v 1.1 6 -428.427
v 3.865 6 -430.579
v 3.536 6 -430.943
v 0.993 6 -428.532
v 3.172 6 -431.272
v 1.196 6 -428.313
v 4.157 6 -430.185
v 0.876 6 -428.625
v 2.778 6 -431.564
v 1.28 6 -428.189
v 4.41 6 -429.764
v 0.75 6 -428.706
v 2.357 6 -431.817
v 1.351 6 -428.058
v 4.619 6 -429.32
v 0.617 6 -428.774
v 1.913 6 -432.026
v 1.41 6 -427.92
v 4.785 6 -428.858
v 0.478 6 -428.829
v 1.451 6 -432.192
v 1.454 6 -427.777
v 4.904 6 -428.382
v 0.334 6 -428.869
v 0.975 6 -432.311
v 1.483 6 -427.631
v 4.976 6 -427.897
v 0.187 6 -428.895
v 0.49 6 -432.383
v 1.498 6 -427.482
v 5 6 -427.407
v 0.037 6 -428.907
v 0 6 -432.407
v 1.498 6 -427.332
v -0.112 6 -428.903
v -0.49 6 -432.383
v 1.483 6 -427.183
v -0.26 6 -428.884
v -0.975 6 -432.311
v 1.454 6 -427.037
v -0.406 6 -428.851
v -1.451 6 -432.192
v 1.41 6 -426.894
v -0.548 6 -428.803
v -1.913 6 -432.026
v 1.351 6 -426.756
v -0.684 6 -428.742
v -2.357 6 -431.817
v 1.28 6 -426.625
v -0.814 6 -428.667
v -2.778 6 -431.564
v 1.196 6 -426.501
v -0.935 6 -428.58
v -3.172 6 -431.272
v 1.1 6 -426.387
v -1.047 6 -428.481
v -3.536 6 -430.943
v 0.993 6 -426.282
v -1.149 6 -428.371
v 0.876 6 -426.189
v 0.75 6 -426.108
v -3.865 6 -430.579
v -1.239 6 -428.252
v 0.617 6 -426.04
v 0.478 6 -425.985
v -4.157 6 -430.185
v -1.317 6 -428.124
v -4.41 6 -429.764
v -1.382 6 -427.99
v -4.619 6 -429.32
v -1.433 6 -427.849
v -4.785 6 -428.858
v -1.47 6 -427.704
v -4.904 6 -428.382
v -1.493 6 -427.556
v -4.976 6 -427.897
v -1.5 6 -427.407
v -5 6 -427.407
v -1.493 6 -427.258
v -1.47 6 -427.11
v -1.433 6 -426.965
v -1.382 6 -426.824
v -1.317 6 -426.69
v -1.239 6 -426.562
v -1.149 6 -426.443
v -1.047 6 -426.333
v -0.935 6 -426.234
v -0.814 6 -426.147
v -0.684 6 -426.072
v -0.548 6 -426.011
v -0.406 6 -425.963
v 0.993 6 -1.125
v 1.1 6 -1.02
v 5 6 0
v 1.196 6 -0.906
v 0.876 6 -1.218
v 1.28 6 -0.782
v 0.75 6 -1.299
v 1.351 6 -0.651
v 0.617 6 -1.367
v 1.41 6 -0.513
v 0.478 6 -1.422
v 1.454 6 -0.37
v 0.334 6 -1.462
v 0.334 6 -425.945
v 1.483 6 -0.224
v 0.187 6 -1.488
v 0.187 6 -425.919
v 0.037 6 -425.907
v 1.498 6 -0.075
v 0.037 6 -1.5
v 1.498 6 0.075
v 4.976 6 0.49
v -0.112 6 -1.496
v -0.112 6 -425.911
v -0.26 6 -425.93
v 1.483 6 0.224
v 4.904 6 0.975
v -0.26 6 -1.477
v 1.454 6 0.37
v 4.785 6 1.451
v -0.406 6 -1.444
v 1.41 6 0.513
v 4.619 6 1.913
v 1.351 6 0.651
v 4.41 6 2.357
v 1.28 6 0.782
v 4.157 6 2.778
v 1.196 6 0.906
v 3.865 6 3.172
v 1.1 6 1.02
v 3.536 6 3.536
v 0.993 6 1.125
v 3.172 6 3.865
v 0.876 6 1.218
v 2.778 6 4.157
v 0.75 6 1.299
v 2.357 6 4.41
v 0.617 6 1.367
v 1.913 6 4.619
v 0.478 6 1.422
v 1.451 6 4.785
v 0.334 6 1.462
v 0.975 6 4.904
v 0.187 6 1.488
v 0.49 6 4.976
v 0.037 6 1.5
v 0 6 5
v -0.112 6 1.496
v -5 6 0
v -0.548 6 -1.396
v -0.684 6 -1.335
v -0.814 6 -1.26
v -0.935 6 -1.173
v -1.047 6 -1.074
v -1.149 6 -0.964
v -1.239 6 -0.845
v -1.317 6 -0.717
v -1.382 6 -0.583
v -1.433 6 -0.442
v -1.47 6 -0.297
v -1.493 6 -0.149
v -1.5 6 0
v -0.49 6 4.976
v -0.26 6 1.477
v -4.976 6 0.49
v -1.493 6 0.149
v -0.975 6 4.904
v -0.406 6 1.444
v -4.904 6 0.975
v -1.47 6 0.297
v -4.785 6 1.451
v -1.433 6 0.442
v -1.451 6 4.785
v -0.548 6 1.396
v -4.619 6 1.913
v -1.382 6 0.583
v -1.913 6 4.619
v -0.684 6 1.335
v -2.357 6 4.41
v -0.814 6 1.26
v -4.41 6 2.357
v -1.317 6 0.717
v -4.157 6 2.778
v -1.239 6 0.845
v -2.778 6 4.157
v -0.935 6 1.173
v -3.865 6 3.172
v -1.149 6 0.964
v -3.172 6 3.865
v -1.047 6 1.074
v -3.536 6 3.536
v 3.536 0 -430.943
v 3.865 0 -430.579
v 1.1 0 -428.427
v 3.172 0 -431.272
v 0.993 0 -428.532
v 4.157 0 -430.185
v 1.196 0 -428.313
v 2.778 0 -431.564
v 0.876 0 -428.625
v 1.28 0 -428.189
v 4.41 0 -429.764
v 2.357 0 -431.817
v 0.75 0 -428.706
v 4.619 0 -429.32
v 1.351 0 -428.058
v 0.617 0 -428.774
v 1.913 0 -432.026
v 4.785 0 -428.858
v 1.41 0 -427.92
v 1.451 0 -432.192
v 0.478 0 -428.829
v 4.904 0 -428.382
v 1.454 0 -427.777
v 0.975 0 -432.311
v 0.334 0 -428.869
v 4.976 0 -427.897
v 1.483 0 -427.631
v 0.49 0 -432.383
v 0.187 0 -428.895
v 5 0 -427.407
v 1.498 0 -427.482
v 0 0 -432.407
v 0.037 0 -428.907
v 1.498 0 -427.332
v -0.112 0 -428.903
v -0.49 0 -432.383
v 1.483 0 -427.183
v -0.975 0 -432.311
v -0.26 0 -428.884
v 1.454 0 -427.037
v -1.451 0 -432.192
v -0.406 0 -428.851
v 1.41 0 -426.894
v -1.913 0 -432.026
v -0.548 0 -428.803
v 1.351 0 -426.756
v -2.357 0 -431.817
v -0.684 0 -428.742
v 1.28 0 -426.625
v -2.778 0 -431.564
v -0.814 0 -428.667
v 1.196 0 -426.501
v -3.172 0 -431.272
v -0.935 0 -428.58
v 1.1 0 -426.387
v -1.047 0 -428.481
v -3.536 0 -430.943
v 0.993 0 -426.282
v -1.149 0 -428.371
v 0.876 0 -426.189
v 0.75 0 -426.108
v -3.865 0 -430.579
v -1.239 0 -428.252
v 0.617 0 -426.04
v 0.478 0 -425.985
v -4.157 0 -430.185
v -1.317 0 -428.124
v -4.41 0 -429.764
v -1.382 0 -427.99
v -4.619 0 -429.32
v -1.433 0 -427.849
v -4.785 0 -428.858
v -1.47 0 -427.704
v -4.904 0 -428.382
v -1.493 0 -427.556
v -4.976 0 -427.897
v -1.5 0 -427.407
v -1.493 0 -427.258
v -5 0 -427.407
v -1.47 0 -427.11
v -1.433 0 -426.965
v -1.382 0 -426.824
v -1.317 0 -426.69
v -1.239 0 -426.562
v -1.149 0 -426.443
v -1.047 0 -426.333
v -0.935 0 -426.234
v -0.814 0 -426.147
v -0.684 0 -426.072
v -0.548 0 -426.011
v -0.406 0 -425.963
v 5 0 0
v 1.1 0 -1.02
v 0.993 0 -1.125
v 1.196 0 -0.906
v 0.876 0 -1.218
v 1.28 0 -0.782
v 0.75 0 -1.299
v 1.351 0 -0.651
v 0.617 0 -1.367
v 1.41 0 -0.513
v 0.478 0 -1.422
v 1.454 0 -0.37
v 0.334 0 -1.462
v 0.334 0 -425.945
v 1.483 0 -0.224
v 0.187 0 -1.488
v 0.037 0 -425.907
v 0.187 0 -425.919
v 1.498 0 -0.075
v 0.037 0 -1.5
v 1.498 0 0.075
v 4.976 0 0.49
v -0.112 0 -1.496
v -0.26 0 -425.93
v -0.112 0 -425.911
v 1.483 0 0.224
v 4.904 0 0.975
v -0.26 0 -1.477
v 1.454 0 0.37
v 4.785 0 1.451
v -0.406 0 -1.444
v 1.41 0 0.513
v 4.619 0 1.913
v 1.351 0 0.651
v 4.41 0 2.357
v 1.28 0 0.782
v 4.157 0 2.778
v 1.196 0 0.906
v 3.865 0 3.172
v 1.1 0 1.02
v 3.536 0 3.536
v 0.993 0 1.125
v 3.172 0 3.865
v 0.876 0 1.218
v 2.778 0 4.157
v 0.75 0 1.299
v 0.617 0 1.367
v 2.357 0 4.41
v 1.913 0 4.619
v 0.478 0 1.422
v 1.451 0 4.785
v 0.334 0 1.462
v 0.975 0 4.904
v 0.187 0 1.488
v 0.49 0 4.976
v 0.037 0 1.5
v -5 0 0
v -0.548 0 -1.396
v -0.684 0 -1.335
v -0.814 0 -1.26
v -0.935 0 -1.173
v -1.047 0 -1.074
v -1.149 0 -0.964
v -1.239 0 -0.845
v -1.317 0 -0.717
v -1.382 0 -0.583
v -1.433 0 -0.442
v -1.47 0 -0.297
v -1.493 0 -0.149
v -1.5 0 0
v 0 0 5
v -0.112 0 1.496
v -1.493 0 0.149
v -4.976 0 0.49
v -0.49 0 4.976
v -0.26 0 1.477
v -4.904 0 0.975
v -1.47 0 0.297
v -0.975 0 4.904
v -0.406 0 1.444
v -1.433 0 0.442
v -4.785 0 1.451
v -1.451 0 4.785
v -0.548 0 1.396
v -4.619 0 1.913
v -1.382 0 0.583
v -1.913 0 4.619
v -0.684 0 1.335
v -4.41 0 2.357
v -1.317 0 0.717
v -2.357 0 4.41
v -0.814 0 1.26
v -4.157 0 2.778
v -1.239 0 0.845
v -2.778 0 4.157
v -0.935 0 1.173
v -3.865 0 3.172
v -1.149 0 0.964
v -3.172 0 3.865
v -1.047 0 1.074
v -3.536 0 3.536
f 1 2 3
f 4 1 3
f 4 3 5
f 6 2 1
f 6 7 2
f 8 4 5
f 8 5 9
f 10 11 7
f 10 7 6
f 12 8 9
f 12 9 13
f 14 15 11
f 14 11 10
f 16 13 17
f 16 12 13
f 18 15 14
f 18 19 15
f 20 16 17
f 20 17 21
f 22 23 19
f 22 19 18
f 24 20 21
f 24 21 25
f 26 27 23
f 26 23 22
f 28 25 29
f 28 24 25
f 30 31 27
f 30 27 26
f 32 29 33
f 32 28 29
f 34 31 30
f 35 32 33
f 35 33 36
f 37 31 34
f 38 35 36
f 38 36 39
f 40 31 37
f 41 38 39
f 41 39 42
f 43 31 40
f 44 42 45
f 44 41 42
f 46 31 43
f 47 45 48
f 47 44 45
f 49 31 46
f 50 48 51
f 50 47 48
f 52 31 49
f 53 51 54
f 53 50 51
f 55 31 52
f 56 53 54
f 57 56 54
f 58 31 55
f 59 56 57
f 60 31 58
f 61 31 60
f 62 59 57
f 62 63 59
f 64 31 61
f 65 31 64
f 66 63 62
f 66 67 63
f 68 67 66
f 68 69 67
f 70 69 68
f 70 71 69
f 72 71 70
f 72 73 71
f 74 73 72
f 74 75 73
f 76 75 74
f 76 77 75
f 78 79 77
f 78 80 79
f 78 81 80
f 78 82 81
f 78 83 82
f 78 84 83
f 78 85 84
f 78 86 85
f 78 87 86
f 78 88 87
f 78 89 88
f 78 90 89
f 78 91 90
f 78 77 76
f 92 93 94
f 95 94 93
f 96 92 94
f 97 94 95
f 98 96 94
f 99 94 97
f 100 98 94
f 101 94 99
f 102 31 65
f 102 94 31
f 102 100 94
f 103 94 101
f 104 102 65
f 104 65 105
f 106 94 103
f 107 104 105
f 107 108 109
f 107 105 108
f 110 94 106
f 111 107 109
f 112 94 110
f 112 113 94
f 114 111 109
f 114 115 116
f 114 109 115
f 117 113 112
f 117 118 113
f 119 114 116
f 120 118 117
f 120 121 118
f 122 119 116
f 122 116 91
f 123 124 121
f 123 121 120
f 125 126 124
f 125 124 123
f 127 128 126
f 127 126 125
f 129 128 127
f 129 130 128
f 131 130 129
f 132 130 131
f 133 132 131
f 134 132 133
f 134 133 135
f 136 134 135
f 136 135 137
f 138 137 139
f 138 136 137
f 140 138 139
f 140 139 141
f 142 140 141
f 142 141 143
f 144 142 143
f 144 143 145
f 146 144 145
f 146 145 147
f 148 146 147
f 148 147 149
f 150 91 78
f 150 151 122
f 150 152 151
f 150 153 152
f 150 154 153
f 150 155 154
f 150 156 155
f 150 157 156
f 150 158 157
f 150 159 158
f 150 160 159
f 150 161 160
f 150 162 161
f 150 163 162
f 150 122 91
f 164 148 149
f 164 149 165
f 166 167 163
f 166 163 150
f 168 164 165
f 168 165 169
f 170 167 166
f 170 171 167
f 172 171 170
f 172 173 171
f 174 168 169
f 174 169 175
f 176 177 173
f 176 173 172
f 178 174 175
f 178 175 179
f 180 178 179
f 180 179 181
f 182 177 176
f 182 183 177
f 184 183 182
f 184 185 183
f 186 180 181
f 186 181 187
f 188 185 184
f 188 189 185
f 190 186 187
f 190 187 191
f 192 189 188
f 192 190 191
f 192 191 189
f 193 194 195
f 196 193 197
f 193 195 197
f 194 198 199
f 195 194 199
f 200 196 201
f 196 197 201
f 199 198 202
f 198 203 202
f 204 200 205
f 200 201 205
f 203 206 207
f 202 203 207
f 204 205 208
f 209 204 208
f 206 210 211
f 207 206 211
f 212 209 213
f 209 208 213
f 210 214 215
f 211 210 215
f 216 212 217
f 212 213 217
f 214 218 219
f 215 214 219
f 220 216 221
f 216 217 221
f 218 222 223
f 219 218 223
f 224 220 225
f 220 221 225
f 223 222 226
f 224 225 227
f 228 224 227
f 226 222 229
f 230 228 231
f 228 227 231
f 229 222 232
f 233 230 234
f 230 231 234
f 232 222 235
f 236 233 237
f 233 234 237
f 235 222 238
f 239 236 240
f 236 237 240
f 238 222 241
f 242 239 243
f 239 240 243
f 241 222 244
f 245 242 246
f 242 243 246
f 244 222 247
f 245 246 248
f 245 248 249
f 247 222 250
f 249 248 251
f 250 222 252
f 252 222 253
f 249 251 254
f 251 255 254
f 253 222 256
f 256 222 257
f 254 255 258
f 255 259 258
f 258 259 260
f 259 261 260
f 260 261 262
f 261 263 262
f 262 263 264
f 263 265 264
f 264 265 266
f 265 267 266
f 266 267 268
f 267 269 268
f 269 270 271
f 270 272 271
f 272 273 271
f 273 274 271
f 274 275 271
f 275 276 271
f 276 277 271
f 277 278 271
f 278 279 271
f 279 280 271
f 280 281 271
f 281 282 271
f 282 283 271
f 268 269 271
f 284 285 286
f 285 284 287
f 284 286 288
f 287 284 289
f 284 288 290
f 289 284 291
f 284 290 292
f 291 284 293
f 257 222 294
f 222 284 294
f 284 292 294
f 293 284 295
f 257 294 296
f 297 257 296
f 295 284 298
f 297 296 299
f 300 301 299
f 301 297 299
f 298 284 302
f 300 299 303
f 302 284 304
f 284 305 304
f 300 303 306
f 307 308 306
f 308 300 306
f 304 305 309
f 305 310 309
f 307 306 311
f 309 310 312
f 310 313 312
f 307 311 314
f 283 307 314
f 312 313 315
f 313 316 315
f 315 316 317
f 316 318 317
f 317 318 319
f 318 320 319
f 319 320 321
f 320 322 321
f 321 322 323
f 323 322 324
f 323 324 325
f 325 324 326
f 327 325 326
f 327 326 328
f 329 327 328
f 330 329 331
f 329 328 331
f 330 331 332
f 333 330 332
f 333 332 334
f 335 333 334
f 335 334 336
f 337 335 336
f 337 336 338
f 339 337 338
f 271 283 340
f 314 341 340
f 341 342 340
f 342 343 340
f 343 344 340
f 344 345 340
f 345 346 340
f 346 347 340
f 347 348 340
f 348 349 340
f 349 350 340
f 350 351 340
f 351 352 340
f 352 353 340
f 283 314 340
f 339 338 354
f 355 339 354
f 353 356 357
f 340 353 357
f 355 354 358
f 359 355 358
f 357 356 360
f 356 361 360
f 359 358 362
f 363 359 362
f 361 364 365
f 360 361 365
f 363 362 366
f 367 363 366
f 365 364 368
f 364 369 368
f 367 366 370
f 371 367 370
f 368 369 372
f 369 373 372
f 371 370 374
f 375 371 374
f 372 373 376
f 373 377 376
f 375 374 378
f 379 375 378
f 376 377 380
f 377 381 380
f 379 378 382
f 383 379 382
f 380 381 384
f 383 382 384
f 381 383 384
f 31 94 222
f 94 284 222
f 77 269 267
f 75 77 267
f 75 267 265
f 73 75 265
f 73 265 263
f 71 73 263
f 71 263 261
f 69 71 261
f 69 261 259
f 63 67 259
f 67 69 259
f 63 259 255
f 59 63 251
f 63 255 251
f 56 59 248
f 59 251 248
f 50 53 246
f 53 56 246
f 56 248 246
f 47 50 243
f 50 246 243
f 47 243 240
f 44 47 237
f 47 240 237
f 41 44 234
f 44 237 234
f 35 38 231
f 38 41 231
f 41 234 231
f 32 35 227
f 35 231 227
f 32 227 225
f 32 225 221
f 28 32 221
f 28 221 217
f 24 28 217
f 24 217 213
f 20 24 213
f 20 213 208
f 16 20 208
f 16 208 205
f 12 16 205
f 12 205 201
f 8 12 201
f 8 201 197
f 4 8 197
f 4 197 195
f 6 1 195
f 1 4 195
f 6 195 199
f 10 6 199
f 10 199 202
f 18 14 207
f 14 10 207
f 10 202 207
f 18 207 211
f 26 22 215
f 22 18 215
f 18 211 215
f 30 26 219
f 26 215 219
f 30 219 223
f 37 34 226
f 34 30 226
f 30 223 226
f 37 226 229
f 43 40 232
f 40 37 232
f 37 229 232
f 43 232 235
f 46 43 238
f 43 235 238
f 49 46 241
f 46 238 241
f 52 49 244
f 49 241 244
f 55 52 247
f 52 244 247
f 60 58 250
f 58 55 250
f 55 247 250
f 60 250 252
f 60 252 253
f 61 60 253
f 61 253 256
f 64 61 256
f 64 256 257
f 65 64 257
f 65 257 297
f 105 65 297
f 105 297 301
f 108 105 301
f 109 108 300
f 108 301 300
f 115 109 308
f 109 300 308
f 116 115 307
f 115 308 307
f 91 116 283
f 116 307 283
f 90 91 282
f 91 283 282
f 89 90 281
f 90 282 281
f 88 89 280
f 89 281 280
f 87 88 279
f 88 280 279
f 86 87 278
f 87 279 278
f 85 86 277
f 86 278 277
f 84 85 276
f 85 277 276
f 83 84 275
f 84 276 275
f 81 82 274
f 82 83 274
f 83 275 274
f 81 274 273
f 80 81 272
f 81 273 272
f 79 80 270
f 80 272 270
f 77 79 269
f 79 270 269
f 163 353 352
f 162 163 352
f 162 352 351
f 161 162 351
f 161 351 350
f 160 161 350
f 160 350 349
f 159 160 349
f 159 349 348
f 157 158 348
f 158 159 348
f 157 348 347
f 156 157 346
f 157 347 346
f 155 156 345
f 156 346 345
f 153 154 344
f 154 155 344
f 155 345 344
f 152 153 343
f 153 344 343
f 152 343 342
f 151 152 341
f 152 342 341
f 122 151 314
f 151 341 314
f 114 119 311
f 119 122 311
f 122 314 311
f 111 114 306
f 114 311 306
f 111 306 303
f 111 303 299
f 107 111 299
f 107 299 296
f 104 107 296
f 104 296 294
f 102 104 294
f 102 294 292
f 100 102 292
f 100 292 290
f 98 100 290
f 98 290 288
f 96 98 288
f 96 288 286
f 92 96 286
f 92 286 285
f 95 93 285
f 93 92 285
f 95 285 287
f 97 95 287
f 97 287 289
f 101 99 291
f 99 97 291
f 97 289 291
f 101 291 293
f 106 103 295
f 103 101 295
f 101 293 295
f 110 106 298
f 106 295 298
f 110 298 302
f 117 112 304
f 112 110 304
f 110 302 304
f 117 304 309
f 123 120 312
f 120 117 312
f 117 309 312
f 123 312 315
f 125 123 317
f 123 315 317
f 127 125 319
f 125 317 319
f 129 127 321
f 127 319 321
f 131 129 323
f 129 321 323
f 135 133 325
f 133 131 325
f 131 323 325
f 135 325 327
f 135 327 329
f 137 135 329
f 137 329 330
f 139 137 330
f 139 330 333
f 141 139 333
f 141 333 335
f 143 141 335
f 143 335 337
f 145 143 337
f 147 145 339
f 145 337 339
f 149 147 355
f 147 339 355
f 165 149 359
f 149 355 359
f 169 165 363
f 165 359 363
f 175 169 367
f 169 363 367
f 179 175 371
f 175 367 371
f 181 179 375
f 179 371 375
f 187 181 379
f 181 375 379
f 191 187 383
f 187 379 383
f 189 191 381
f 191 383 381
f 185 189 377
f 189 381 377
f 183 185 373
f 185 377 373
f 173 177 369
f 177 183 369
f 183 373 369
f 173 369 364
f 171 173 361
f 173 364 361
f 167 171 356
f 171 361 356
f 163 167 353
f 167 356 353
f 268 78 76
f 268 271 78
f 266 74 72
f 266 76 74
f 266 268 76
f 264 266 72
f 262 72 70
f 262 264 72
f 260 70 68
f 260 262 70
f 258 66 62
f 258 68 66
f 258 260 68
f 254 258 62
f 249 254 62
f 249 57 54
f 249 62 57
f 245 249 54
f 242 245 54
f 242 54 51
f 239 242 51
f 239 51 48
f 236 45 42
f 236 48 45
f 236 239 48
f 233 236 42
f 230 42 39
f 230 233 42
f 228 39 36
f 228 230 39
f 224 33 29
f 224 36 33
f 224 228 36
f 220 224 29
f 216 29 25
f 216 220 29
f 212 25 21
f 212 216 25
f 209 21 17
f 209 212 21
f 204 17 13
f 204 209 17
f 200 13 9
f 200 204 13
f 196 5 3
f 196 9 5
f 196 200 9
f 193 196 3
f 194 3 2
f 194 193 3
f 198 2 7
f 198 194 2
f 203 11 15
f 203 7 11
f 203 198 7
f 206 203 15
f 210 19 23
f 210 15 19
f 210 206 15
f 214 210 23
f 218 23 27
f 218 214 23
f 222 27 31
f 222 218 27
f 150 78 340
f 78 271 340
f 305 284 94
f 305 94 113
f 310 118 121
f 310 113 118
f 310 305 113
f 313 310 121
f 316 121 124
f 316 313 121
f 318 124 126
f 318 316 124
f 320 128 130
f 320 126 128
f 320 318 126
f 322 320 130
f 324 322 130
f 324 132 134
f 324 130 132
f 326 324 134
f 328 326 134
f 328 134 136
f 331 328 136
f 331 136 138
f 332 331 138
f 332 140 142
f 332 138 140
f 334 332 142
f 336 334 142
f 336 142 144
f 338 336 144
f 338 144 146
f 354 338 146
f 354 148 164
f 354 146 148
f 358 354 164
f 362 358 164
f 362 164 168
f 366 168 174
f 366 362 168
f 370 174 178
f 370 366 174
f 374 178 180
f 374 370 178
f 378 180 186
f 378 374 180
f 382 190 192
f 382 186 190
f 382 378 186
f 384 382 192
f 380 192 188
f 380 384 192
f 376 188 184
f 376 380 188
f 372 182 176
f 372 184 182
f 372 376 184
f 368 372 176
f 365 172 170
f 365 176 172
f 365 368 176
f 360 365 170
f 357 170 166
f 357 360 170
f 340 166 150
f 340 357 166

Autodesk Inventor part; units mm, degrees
ref_plane "YZ Plane" through (0, 0, 0) normal (1, 0, 0) x (0, 1, 0)
ref_plane "XZ Plane" through (0, 0, 0) normal (0, 1, 0) x (-1, 0, 0)
ref_plane "XY Plane" through (0, 0, 0) normal (0, 0, 1) x (1, 0, 0)
sketch "Sketch1" plane through (0, 0, 0) normal (0, 1, 0) x (-1, 0, 0)
  line L0 (0, 0) -> (0, -427.407) construction
  line L1 (-5, 0) -> (-5, -427.407)
  line L2 (5, -427.407) -> (5, 0)
  arc A0 (5, 0) -> (-5, 0) centre (0, 0) ccw
  arc A1 (-5, -427.407) -> (5, -427.407) centre (0, -427.407) ccw
  circle A2 centre (0, 0) radius 1.5
  circle A3 centre (0, -427.407) radius 1.5
  point P0 (0, -213.7035)
  dimension "d1" = 427.407
  dimension "d2" = 10
  dimension "d3" = 3
  dimension "d4" = 3
extrude "Extrusion1" add sketch "Sketch1" along normal blind 6
